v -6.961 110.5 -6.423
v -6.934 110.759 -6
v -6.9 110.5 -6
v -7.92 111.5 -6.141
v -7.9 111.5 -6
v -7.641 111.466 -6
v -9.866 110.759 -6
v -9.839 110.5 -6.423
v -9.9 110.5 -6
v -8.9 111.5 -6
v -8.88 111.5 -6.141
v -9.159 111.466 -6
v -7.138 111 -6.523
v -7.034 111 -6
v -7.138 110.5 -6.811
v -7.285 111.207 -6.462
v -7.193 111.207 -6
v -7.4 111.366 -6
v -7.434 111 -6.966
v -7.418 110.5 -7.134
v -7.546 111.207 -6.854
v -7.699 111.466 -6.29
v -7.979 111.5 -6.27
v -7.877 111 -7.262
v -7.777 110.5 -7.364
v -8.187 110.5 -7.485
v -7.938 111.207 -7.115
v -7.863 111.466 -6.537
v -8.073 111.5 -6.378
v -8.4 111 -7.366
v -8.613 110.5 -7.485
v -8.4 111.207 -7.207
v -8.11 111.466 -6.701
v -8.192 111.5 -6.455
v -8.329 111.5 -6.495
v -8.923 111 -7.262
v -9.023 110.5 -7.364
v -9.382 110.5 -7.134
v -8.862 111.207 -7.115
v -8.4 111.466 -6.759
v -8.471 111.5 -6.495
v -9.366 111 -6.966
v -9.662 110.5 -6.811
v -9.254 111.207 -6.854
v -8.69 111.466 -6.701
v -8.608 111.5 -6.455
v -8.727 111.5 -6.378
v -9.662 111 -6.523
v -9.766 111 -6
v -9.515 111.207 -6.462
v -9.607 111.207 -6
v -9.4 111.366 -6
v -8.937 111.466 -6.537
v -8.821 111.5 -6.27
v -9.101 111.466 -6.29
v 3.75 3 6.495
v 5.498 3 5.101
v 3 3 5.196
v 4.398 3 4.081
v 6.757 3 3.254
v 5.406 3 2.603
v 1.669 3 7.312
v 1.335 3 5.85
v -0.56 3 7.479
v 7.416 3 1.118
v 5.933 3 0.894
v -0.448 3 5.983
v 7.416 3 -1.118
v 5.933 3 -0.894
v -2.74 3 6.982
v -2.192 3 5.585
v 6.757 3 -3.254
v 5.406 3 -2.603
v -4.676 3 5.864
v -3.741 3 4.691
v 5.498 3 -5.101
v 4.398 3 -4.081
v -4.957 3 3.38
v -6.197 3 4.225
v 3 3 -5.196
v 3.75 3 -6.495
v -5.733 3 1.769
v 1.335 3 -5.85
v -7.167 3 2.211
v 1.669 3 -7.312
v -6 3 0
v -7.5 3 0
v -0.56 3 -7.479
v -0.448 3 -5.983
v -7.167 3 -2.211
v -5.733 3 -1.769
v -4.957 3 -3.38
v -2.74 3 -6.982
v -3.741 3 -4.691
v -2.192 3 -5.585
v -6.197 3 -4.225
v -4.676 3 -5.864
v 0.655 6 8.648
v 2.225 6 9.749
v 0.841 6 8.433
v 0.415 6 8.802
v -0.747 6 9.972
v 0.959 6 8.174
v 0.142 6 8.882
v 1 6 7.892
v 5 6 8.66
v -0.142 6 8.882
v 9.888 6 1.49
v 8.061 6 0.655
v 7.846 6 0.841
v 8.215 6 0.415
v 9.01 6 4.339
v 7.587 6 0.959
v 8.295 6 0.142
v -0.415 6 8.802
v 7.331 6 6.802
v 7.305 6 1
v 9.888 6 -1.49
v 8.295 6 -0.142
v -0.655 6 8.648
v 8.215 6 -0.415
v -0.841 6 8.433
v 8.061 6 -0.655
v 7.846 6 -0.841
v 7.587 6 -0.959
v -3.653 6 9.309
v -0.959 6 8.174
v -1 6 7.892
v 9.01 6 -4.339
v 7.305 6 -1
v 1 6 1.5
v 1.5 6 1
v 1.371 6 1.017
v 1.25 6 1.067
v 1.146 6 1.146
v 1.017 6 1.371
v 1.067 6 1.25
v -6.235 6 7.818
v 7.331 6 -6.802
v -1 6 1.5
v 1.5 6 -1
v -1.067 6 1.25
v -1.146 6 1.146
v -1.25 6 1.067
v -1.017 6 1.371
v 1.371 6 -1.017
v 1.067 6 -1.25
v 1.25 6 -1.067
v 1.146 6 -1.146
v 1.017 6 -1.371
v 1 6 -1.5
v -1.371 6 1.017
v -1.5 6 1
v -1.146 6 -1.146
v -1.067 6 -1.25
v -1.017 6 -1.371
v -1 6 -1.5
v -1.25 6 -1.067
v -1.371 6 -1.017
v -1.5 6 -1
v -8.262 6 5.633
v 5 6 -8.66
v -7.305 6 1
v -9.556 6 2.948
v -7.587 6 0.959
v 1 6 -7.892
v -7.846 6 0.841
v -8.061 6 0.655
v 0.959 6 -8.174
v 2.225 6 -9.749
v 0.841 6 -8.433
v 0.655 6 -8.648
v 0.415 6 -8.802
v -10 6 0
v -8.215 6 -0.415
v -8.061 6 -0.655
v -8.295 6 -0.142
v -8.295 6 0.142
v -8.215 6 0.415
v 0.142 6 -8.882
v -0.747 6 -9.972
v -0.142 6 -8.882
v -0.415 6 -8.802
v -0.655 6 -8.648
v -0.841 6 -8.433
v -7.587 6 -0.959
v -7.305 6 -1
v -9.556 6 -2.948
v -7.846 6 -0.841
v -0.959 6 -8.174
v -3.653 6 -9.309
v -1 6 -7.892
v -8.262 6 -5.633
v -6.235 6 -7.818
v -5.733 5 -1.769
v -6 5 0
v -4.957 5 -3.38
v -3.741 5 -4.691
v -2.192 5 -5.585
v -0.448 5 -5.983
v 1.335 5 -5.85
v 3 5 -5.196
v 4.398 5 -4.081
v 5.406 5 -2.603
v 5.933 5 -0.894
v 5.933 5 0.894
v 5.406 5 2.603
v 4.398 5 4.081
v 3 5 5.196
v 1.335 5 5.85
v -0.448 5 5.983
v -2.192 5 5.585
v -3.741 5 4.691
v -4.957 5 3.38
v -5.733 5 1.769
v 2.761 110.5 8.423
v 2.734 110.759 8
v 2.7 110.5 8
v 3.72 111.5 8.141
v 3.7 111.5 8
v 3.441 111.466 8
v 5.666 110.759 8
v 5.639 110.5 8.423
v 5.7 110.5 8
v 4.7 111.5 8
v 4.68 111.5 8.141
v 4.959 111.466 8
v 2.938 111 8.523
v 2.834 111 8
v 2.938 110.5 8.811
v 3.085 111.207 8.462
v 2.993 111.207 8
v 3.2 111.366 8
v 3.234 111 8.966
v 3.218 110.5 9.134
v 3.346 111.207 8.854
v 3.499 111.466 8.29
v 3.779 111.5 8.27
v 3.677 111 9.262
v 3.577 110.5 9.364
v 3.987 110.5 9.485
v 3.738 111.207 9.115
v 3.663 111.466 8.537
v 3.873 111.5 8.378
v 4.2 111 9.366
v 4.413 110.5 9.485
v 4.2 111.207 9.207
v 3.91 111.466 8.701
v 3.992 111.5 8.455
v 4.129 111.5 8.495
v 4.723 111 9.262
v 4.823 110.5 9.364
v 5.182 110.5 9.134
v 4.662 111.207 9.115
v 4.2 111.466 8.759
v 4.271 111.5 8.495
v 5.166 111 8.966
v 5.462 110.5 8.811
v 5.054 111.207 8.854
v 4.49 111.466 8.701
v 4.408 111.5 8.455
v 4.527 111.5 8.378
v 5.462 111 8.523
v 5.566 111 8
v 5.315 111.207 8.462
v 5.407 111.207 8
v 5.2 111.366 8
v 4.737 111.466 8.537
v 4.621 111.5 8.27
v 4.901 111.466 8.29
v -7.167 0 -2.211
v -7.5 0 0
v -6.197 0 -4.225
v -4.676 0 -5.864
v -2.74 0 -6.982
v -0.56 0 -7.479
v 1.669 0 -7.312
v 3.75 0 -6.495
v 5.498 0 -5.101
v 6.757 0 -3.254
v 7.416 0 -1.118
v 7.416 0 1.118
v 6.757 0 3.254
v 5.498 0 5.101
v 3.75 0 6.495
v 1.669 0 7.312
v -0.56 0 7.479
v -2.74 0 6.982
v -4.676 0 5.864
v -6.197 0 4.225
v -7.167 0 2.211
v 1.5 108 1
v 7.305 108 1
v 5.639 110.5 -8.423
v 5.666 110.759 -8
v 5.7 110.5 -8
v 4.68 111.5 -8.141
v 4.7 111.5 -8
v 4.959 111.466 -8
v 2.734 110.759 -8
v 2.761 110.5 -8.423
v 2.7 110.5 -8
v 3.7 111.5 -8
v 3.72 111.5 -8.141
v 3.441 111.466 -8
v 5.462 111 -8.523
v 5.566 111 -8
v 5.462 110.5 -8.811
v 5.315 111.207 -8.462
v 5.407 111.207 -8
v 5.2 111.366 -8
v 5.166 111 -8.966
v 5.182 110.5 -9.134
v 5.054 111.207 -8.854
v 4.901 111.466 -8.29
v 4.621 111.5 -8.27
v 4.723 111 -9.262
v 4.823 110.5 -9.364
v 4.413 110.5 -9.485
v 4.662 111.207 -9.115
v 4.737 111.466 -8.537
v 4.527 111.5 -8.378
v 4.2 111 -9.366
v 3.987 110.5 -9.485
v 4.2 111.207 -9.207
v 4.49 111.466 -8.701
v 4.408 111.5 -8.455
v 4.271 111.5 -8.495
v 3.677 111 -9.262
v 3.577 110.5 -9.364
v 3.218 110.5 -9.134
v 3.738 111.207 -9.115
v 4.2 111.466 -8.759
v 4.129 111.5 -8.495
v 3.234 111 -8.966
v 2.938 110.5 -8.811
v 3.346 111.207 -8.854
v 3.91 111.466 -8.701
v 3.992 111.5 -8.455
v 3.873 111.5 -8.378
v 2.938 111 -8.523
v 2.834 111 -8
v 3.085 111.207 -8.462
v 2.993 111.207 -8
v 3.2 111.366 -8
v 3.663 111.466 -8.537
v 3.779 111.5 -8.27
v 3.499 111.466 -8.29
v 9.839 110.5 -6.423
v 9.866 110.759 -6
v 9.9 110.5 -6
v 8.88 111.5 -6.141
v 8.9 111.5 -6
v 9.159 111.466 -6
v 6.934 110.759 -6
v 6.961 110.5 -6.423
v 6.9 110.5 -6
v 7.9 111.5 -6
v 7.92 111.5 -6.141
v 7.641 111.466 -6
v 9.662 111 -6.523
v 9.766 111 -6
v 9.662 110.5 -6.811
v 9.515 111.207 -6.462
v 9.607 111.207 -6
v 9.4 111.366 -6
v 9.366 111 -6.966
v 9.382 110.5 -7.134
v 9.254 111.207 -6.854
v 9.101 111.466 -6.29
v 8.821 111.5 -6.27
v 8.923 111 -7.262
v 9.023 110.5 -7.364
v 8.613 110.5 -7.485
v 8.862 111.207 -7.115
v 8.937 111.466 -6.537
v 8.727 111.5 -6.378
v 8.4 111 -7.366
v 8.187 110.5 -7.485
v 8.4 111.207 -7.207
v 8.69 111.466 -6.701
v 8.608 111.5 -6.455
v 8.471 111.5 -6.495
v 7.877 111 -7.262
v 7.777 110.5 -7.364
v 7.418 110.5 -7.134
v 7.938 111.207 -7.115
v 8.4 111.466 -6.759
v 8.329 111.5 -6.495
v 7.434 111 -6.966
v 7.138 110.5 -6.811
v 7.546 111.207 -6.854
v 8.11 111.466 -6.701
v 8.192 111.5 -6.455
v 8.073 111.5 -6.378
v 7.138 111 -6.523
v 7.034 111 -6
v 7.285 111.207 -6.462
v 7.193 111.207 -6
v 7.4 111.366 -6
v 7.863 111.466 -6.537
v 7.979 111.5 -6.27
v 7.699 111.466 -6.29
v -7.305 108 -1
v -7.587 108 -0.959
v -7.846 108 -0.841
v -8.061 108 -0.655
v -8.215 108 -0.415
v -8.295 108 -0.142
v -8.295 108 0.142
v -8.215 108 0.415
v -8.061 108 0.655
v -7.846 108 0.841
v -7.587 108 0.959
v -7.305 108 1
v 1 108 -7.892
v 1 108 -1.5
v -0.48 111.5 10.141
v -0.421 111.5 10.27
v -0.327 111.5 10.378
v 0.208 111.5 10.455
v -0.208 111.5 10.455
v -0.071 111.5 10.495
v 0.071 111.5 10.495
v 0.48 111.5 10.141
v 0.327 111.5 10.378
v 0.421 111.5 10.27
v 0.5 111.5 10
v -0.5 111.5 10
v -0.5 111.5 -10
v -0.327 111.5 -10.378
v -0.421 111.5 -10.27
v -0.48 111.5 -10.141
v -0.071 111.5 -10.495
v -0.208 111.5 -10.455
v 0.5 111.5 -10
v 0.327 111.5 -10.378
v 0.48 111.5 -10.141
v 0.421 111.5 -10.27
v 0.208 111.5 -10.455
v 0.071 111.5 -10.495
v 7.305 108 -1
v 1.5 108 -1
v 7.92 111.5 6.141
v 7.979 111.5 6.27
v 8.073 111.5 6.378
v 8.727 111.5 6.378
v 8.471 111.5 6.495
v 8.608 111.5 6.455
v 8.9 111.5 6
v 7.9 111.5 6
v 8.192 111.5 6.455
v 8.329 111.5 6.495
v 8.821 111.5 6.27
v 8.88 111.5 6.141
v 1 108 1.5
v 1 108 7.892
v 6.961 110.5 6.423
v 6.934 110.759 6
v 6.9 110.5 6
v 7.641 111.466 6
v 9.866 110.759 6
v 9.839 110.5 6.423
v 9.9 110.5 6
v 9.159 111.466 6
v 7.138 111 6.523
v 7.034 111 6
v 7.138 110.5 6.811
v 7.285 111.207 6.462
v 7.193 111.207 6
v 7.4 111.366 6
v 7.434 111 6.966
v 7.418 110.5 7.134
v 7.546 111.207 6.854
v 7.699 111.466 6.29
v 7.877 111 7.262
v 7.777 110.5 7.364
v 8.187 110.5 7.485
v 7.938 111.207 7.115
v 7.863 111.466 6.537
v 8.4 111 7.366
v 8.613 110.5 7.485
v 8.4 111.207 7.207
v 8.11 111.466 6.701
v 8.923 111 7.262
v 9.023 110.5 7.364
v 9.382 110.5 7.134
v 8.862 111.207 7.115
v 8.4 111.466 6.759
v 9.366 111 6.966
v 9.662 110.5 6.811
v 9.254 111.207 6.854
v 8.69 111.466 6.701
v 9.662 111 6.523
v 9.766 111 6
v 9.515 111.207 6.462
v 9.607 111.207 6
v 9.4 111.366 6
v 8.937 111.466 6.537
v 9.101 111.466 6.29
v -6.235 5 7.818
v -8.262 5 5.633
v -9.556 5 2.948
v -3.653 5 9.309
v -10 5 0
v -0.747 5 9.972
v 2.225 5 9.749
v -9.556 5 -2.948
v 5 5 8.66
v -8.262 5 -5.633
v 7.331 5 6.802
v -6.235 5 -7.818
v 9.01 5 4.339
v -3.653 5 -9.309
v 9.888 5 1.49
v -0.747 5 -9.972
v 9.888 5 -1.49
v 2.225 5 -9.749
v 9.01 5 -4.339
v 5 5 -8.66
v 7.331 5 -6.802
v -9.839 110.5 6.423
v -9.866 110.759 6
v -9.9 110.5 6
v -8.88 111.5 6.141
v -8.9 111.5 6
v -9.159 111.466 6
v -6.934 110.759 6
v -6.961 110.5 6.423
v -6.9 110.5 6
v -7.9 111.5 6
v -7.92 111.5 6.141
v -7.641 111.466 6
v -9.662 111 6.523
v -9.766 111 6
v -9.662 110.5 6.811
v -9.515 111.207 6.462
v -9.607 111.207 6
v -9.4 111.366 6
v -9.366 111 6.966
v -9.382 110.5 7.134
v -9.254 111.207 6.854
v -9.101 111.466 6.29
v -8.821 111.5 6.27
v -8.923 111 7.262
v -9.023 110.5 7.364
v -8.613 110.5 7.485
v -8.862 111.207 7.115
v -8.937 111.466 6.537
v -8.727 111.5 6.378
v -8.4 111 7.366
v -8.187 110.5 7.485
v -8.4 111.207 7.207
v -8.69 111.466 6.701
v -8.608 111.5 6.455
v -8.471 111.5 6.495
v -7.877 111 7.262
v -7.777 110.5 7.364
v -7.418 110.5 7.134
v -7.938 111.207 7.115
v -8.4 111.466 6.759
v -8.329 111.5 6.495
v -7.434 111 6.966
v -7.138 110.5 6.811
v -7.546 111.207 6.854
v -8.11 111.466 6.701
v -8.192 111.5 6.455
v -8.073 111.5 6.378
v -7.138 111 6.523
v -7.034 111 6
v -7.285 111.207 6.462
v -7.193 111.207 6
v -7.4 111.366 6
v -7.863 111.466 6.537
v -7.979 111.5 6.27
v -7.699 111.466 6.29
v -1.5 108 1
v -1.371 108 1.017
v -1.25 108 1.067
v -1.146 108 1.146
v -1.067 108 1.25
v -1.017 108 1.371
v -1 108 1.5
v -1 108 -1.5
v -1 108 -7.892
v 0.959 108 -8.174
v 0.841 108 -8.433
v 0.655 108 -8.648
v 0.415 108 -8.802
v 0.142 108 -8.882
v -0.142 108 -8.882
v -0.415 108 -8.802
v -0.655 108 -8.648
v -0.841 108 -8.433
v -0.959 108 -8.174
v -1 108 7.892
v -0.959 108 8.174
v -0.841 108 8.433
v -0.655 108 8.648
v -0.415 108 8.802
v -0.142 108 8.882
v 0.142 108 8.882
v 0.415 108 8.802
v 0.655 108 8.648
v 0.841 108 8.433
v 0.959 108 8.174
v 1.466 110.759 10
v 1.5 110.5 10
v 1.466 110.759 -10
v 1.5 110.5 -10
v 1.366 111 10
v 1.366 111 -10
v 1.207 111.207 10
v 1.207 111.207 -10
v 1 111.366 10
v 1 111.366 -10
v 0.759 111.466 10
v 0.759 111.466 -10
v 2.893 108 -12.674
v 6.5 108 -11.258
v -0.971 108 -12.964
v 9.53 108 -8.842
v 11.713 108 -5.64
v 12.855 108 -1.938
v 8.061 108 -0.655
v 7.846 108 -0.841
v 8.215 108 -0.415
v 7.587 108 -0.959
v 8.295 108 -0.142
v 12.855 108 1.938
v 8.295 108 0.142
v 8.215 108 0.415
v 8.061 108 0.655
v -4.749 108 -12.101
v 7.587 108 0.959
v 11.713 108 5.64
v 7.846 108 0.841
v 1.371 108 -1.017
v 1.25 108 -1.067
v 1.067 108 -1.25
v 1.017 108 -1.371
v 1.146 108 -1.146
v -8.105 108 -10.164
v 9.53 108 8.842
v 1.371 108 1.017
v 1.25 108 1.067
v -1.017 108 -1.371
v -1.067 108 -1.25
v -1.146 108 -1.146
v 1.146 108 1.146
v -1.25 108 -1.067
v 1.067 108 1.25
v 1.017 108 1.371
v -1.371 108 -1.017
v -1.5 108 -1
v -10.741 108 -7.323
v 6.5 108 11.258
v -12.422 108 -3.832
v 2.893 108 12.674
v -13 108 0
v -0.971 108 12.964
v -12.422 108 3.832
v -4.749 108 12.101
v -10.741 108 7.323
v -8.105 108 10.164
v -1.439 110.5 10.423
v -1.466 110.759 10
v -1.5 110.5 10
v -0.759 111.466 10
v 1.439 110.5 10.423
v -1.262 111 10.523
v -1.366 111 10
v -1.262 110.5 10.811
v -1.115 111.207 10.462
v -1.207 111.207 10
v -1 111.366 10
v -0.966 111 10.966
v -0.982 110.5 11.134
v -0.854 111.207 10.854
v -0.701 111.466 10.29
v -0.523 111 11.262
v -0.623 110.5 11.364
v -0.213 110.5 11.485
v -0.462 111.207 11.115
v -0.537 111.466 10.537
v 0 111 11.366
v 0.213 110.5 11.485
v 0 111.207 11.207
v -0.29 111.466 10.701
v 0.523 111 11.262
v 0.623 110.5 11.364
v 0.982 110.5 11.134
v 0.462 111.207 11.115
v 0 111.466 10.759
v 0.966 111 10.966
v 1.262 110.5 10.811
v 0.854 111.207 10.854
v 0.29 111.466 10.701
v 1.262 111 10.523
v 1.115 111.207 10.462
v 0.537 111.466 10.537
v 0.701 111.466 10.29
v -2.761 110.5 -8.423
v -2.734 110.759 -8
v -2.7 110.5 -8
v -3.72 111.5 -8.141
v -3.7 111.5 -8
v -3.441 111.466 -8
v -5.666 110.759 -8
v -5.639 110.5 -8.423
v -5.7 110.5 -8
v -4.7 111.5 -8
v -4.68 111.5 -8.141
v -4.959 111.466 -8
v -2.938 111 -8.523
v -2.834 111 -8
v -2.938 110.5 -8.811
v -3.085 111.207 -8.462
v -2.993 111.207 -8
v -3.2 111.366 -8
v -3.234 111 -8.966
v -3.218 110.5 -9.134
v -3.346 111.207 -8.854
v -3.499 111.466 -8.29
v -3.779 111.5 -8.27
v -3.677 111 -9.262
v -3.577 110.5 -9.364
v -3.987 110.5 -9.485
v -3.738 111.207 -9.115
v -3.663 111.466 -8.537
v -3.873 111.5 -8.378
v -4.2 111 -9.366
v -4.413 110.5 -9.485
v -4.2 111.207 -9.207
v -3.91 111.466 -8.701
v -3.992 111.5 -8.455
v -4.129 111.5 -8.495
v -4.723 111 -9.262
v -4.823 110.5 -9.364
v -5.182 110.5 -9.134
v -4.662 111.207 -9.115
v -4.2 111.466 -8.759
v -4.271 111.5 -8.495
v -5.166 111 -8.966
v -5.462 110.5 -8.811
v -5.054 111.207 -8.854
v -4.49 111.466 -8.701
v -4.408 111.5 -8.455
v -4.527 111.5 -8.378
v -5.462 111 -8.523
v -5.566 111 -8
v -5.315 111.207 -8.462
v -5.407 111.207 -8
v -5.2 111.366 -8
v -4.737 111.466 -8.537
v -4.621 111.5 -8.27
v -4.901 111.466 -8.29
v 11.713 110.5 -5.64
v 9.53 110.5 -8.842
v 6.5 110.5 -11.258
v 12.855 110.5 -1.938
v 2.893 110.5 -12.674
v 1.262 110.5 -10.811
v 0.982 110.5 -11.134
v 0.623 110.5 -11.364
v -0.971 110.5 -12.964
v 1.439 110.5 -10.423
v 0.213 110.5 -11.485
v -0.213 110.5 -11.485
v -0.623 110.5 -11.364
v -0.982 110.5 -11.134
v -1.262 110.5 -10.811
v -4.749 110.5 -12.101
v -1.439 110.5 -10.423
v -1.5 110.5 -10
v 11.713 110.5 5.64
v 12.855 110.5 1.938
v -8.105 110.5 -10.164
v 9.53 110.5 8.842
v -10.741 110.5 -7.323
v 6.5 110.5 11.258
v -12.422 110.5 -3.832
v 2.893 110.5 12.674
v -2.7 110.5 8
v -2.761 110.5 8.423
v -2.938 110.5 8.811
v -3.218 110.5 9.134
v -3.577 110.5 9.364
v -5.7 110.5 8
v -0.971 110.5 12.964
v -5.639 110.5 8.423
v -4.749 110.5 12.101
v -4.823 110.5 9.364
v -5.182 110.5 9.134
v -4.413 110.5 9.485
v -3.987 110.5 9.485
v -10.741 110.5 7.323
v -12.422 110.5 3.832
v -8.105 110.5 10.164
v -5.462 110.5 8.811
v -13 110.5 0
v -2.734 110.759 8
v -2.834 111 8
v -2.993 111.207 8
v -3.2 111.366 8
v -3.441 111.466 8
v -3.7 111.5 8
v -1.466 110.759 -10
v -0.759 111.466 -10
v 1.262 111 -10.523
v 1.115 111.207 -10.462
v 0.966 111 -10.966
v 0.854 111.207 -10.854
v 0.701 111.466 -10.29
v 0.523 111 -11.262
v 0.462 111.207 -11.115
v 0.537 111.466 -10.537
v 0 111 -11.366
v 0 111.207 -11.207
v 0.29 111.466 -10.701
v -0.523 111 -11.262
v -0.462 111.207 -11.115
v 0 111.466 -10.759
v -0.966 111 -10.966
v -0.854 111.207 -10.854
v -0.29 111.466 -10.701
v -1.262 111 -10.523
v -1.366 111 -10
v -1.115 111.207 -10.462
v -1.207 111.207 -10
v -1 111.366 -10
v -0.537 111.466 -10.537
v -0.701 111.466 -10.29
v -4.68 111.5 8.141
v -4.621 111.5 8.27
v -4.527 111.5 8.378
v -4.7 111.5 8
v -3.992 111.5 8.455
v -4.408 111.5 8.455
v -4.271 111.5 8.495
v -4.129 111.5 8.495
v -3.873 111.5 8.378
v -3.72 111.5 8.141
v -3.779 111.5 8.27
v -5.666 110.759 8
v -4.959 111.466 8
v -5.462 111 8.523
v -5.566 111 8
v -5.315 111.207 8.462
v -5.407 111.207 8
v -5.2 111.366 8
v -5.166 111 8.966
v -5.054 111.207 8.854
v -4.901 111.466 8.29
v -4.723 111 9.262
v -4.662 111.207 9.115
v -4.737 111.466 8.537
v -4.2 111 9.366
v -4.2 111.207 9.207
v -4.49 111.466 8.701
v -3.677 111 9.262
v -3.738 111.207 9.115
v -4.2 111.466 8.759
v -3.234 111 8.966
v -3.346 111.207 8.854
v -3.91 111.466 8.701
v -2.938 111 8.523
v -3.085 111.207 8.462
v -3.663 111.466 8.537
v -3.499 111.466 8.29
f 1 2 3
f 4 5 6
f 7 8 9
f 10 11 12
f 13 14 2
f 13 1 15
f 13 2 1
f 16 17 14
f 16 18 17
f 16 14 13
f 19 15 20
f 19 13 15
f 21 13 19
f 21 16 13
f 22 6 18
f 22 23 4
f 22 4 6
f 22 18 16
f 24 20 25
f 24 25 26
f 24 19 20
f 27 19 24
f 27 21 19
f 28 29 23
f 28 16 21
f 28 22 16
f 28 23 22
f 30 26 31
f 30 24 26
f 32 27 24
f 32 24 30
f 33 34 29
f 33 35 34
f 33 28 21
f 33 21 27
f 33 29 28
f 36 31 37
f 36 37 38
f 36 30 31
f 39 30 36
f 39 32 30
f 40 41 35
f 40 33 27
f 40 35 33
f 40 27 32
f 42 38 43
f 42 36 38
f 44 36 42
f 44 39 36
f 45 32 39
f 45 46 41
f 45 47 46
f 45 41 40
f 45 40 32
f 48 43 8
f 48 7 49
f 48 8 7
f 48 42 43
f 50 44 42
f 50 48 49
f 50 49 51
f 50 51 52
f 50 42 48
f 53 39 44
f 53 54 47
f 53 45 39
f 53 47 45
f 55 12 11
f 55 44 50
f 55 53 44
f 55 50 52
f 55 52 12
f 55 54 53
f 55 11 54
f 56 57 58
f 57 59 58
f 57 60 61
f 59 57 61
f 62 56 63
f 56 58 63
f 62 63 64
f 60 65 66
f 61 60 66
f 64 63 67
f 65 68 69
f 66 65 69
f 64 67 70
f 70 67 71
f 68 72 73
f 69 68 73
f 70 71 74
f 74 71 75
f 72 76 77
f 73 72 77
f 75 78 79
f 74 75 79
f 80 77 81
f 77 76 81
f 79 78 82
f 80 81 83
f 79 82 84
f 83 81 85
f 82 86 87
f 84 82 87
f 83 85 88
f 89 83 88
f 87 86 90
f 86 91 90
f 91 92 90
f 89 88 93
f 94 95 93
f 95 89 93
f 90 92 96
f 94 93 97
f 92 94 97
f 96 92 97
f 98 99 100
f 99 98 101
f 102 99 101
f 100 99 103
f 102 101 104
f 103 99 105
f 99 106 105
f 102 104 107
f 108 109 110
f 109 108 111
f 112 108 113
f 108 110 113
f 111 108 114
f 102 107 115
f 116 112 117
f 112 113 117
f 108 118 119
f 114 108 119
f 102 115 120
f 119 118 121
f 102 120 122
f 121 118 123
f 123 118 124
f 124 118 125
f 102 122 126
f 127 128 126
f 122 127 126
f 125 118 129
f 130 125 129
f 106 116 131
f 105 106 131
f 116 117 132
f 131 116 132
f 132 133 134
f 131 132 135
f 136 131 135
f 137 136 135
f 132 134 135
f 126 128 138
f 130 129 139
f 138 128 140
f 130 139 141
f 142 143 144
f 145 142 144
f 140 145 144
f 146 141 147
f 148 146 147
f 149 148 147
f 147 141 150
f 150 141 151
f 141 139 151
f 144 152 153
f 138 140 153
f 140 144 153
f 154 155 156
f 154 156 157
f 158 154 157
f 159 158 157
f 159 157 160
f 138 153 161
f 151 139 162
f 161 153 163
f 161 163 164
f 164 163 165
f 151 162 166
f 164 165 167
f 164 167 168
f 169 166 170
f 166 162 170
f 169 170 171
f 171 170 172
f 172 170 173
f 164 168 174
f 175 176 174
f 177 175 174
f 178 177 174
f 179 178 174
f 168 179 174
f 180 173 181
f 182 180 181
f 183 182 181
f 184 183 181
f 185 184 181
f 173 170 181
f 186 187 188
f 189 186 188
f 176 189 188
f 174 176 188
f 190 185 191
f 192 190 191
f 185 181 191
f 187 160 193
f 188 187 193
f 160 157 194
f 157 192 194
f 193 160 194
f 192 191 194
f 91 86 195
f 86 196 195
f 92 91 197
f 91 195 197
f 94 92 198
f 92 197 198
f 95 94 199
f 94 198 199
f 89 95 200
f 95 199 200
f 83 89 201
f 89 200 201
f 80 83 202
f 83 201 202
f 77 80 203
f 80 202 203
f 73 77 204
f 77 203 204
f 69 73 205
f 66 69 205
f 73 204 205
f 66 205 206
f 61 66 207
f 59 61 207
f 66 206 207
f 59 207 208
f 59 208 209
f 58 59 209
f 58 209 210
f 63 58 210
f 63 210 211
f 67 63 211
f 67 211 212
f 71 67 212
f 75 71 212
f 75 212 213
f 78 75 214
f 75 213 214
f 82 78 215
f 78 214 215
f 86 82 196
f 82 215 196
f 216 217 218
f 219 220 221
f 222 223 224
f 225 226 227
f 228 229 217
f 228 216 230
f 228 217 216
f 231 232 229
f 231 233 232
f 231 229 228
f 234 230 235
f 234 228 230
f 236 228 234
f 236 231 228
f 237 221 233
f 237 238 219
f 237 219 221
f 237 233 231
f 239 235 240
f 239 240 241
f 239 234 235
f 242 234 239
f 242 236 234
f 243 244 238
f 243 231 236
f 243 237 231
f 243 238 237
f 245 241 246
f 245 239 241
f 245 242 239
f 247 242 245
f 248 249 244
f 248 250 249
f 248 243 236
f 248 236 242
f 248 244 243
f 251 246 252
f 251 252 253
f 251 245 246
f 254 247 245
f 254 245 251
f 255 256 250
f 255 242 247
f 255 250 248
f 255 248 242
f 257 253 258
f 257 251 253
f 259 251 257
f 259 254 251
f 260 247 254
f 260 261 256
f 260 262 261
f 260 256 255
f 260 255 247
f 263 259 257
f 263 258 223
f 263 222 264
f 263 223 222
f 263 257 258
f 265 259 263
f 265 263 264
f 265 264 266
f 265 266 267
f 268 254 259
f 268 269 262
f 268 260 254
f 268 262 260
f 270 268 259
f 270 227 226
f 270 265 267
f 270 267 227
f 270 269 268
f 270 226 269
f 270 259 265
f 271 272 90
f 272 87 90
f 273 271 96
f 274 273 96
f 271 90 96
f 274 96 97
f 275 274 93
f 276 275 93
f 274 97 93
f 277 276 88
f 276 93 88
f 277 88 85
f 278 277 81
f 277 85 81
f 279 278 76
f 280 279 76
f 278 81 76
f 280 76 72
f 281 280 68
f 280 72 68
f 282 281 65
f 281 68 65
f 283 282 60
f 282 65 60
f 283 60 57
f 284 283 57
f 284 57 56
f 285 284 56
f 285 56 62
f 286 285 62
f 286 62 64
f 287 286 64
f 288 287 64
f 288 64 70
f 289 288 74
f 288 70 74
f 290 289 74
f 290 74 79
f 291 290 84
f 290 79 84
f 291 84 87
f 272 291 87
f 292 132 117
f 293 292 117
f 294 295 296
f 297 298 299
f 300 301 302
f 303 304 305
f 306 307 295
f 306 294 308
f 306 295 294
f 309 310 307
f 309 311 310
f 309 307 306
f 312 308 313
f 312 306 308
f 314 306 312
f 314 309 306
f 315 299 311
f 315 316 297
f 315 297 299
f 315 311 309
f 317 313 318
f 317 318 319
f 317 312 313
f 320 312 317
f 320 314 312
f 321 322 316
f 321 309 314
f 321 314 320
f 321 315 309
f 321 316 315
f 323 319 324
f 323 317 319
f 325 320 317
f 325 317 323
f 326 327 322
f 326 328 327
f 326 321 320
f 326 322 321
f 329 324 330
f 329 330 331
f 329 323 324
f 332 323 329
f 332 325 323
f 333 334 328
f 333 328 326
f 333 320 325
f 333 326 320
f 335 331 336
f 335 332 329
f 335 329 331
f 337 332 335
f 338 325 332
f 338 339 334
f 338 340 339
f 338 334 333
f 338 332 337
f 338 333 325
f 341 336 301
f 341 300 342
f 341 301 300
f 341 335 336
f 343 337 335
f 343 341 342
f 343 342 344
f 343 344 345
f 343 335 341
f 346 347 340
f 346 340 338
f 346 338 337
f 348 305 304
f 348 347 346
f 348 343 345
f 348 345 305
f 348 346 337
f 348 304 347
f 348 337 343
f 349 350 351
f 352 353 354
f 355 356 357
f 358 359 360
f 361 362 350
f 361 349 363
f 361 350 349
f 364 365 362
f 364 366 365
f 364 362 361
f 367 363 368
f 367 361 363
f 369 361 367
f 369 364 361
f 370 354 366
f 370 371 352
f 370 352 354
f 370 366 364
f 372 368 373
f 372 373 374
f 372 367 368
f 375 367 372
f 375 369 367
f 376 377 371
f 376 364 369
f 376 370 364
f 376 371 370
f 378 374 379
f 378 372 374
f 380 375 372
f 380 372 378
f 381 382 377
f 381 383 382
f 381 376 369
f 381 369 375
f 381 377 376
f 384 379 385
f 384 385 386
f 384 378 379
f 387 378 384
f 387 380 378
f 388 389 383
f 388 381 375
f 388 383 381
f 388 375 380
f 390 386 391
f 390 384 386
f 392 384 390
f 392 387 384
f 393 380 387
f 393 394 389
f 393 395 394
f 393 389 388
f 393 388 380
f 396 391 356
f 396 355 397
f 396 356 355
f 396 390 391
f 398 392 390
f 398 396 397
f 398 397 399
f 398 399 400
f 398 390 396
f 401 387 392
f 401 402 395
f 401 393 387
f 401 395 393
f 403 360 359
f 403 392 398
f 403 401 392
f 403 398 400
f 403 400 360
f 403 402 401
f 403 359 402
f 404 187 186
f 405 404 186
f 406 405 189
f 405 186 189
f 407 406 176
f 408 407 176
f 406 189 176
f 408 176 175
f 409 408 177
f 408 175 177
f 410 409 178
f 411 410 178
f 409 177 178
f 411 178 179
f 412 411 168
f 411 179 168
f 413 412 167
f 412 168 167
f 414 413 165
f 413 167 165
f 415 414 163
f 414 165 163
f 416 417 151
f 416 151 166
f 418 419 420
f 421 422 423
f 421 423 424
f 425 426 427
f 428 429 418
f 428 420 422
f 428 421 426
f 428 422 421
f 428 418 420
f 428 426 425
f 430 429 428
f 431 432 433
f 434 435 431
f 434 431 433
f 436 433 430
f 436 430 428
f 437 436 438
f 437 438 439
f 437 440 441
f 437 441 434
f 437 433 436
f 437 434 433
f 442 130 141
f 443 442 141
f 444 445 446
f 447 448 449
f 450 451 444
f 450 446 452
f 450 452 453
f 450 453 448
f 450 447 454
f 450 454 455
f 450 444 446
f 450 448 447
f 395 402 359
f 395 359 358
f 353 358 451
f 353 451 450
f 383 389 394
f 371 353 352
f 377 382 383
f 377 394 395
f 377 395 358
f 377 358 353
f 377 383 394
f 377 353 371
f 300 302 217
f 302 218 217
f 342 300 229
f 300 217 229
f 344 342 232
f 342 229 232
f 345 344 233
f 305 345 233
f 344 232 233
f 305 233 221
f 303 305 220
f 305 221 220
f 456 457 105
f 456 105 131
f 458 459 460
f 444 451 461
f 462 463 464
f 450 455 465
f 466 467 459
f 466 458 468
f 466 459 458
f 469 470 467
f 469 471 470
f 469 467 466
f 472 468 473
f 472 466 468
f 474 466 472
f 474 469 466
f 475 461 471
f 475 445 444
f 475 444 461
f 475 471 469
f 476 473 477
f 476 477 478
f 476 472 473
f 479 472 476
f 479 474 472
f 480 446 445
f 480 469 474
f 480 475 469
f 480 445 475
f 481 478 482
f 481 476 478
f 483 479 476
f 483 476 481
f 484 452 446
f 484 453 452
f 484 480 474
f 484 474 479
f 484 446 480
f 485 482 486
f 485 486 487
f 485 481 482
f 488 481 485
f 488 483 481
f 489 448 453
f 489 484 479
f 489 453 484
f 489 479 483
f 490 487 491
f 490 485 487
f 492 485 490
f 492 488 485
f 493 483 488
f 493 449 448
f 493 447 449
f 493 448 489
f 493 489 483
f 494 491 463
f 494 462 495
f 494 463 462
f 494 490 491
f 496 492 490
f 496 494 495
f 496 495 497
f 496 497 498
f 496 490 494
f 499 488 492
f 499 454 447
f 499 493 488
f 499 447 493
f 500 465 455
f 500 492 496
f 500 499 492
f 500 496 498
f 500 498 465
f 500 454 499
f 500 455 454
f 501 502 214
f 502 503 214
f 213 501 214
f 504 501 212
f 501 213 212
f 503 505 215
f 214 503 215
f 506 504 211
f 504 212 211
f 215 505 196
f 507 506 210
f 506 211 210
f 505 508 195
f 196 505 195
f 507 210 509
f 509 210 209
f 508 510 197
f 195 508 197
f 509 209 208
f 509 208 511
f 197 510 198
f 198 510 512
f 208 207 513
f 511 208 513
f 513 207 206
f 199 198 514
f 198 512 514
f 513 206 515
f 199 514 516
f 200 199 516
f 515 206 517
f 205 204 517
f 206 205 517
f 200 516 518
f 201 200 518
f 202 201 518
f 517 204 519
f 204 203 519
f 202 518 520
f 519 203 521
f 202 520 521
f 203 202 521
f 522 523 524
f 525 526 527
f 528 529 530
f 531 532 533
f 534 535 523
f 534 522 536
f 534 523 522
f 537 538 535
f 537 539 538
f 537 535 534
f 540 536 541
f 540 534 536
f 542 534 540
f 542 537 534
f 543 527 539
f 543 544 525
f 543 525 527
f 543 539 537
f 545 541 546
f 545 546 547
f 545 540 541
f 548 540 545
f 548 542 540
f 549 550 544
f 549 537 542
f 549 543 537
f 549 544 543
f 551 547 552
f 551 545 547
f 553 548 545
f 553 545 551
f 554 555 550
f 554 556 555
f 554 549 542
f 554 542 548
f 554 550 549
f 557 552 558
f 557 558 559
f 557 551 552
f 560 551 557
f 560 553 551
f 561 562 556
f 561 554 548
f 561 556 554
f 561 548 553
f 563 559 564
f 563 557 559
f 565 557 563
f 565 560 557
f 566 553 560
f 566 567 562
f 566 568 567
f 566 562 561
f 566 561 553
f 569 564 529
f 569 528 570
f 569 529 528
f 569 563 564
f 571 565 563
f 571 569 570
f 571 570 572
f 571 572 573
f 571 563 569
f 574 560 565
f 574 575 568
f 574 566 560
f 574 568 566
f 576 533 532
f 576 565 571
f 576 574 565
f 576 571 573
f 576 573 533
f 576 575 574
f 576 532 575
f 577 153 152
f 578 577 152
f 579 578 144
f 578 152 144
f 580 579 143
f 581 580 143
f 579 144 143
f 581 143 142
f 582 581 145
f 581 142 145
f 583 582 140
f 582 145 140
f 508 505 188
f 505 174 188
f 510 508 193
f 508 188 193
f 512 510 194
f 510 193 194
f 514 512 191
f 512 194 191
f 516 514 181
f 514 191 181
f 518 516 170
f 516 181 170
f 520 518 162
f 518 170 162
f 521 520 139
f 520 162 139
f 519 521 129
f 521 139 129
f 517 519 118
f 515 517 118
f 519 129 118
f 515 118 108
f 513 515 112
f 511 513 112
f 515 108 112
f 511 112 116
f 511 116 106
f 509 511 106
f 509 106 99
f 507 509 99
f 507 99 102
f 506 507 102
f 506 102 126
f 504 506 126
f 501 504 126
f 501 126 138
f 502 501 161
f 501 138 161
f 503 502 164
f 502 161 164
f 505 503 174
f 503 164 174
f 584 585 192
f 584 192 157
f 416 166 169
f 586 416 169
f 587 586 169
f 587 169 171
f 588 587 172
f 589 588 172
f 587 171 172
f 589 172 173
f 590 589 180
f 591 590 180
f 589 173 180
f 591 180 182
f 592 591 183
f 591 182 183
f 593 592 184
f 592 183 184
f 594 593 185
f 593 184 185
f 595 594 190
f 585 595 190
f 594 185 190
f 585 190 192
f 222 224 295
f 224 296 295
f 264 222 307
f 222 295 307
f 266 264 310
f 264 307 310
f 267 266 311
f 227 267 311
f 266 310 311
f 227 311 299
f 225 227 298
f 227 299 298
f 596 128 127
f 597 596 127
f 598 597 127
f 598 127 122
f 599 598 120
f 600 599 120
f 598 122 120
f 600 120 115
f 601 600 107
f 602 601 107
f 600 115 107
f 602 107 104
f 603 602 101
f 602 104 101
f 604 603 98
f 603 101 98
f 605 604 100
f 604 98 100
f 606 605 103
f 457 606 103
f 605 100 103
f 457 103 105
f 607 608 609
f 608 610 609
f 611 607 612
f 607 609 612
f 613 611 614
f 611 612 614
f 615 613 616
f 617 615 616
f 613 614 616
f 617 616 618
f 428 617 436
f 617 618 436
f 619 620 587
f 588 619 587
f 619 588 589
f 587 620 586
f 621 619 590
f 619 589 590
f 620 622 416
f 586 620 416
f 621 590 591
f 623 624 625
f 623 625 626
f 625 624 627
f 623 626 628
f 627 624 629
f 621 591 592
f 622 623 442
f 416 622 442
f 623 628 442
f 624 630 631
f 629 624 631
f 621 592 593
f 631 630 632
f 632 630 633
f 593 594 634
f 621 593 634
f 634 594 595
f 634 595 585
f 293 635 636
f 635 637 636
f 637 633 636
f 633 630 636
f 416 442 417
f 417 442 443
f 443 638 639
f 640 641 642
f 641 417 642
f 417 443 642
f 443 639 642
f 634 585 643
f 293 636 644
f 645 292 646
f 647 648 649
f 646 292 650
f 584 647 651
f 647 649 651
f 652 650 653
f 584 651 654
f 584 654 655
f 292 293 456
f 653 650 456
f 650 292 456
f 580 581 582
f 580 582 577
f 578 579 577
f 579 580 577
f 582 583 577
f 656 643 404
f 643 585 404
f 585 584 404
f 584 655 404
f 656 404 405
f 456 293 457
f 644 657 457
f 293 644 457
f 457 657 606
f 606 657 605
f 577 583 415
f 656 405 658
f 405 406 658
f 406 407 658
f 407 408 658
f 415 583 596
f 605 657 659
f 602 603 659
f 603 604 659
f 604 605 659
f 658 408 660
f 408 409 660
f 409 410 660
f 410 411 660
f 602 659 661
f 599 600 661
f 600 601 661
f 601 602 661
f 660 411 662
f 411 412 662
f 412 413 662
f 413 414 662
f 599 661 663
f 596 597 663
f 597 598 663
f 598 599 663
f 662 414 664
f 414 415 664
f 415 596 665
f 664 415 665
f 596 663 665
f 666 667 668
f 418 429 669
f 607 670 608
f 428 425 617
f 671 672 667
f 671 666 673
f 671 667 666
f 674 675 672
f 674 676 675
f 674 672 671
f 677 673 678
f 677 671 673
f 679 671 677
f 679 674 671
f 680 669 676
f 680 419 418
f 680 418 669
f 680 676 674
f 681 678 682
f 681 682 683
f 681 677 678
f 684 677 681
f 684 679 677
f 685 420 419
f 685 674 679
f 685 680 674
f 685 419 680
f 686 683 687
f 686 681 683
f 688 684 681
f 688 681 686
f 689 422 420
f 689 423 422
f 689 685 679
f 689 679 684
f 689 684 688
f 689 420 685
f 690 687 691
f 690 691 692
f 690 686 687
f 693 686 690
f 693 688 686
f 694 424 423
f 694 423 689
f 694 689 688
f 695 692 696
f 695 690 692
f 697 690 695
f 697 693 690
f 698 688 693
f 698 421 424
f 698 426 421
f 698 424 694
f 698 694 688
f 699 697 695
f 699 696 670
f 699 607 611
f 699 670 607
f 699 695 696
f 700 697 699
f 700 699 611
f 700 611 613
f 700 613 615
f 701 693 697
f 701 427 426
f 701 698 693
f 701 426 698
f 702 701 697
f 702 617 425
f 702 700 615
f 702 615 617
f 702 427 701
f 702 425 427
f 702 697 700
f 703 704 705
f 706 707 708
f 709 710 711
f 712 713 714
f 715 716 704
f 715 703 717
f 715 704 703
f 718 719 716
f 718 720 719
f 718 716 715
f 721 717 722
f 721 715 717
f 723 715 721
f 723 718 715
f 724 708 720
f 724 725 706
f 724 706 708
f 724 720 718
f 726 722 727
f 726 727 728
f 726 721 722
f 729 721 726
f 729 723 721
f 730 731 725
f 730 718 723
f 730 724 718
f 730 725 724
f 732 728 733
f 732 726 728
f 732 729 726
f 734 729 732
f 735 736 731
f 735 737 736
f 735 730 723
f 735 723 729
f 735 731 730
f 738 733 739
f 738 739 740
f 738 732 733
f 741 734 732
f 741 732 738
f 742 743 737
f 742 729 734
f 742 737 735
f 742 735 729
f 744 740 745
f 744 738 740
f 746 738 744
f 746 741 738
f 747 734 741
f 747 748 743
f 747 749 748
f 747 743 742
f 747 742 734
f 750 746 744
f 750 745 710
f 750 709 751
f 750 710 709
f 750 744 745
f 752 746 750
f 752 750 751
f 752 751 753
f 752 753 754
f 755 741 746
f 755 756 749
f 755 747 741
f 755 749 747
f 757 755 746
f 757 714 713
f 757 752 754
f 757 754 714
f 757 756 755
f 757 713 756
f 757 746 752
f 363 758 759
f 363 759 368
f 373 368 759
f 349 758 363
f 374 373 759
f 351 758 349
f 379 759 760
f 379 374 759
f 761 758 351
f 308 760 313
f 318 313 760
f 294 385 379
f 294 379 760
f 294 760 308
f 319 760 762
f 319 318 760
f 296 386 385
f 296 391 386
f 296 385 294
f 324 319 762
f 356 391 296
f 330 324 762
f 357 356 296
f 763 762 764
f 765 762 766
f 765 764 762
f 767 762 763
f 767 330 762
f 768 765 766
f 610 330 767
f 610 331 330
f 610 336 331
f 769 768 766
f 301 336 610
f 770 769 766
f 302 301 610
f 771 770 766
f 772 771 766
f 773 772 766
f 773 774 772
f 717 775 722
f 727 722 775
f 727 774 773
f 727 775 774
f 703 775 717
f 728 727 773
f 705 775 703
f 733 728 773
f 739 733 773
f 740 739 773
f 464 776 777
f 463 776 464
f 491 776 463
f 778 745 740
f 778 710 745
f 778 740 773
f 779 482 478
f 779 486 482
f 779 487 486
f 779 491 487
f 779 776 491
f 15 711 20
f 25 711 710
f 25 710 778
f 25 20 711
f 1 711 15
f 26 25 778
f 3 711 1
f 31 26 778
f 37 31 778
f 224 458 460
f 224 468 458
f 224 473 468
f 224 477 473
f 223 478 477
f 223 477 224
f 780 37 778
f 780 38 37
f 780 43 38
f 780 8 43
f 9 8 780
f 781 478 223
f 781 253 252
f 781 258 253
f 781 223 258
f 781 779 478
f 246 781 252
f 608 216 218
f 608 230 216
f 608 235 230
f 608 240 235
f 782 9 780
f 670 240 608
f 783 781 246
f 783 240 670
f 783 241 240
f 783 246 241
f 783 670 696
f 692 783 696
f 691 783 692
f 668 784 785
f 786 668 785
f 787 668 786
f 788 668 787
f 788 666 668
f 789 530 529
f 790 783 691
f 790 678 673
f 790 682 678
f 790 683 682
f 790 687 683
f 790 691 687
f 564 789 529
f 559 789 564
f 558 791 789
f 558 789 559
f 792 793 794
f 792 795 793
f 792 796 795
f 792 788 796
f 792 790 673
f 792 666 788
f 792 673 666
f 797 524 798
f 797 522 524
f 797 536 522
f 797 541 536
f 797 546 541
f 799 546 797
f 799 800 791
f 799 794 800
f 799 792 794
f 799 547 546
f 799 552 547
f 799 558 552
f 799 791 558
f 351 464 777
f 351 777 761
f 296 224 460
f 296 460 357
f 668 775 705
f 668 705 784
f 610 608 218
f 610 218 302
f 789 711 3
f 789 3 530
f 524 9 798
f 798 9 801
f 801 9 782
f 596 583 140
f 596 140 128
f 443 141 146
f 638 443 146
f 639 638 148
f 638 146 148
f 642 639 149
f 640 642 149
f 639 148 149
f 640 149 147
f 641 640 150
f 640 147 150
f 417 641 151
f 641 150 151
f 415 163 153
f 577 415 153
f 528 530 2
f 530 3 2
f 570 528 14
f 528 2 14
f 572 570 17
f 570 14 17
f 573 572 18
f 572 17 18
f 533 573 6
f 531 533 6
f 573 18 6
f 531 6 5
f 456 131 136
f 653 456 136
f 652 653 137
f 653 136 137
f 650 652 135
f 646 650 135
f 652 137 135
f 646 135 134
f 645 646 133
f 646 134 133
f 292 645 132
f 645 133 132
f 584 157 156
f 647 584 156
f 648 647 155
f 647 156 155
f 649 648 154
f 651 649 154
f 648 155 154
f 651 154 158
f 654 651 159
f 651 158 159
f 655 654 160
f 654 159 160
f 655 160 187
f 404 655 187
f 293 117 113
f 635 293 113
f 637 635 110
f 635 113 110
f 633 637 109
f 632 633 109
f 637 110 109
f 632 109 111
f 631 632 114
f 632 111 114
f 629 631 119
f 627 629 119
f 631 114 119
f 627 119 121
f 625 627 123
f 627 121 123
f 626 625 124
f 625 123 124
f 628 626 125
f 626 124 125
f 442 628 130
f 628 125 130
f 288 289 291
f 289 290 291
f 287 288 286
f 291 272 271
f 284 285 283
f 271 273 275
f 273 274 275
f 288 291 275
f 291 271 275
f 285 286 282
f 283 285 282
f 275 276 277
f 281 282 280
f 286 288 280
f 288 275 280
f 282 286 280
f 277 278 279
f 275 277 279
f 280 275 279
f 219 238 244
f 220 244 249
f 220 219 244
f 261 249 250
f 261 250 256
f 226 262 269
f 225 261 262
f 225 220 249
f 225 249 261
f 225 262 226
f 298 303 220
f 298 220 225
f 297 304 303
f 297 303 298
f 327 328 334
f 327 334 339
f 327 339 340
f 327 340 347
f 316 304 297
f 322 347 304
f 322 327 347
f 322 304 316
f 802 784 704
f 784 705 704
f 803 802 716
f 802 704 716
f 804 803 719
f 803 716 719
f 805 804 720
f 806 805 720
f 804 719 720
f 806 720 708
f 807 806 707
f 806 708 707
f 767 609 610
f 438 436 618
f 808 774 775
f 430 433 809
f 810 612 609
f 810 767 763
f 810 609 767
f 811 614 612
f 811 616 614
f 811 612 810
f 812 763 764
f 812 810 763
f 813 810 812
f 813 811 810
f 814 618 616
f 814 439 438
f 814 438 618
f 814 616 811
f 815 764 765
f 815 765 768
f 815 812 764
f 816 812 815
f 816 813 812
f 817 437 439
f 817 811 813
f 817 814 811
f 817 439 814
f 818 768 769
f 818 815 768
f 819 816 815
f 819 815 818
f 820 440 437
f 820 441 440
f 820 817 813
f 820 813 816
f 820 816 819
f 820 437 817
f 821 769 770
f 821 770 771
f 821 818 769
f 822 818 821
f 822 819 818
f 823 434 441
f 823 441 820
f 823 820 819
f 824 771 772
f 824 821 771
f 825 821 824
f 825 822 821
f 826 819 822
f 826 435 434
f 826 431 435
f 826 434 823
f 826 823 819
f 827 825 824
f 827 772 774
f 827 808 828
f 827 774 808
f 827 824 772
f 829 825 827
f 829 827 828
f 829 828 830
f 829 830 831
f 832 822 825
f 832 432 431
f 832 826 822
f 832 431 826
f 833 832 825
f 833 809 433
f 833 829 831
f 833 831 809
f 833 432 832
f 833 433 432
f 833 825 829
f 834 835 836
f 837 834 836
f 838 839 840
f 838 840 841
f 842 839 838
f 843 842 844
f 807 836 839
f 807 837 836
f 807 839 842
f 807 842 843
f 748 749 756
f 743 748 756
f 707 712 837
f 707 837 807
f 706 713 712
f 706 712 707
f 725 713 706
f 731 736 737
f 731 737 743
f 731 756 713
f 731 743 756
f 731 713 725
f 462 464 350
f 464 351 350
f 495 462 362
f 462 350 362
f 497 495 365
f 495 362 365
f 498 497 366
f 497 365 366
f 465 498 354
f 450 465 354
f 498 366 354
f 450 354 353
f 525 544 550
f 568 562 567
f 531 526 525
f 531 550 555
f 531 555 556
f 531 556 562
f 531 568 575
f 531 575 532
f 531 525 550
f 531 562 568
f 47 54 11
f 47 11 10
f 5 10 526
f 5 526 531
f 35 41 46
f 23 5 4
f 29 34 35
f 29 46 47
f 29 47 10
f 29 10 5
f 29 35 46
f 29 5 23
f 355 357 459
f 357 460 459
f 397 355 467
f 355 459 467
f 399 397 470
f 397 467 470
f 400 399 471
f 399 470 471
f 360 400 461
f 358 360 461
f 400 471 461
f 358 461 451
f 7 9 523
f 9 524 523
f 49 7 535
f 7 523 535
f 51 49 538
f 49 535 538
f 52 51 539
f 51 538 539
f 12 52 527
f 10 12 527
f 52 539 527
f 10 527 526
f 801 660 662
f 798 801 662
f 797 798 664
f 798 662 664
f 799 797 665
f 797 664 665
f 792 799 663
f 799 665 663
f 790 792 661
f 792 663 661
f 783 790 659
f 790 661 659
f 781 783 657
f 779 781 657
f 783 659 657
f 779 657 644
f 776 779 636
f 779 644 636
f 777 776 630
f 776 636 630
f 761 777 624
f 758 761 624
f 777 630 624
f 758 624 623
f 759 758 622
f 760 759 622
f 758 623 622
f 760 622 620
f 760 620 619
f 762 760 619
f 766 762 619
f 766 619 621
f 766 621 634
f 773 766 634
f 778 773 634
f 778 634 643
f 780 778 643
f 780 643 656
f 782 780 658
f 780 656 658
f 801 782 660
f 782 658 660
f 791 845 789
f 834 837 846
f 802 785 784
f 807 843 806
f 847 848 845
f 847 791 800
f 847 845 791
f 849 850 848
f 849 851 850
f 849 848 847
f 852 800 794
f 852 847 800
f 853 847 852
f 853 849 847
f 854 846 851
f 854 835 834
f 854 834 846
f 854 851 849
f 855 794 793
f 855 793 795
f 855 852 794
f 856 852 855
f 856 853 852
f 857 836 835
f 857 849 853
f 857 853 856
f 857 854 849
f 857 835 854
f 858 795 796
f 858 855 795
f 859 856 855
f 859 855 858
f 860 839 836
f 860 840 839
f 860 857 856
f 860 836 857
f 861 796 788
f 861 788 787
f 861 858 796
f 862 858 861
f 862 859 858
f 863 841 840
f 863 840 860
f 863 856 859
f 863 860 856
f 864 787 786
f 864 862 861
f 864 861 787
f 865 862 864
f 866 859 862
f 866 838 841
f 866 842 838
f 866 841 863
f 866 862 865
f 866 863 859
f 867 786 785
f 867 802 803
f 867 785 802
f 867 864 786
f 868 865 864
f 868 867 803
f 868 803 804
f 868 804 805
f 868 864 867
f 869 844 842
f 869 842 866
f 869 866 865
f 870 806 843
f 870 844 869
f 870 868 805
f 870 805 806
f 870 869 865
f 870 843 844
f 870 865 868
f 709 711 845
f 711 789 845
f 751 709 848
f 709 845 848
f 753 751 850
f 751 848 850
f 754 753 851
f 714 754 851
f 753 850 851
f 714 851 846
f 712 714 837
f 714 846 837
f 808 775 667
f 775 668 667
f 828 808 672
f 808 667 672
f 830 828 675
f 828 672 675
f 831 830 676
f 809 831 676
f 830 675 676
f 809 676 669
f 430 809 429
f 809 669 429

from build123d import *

# Parameters (mm, degrees)
BOSS_EXTRUDE1_DEPTH = 102
SKETCH3_R           = 13
BOSS_EXTRUDE3_DEPTH = 2.5
BOSS_EXTRUDE4_DEPTH = 1
FILLET1_R           = 1


with BuildPart() as part:
    # Sketch1 → Revolve1 (revolve)
    with BuildSketch(Plane.XY, mode=Mode.PRIVATE) as revolve1_sk:
        Polygon((0, 0), (7.5, 0), (7.5, 3), (6, 3), (6, 5), (10, 5), (10, 6), (0, 6), align=None)
    revolve(revolve1_sk.sketch.rotate(Axis((0, 6, 0), (0, -1, 0)), 180), axis=Axis((0, 6, 0), (0, -1, 0)))

    # Sketch2 → Boss-Extrude1 (add)
    with BuildSketch(Plane(origin=(0, 6, 0), x_dir=(1, 0, 0), z_dir=(0, 1, 0))):
        with BuildLine():
            Line((-1, 7.891889069), (-1, 1.5))
            ThreePointArc((-1, 1.5), (-1.146446609, 1.146446609), (-1.5, 1))
            Line((-1.5, 1), (-7.304889055, 1))
            ThreePointArc((-7.304889055, 1), (-8.304889055, 0), (-7.304889055, -1))
            Line((-7.304889055, -1), (-1.5, -1))
            ThreePointArc((-1.5, -1), (-1.146446609, -1.146446609), (-1, -1.5))
            Line((-1, -1.5), (-1, -7.891889069))
            ThreePointArc((-1, -7.891889069), (0, -8.891889069), (1, -7.891889069))
            Line((1, -7.891889069), (1, -1.5))
            ThreePointArc((1, -1.5), (1.146446609, -1.146446609), (1.5, -1))
            Line((1.5, -1), (7.304889055, -1))
            ThreePointArc((7.304889055, -1), (8.304889055, 0), (7.304889055, 1))
            Line((7.304889055, 1), (1.5, 1))
            ThreePointArc((1.5, 1), (1.146446609, 1.146446609), (1, 1.5))
            Line((1, 1.5), (1, 7.891889069))
            ThreePointArc((1, 7.891889069), (0, 8.891889069), (-1, 7.891889069))
        make_face()
    extrude(amount=BOSS_EXTRUDE1_DEPTH)

    # Sketch3 → Boss-Extrude3 (add)
    with BuildSketch(Plane(origin=(0, 108, 0), x_dir=(1, 0, 0), z_dir=(0, 1, 0))):
        with Locations(Location((0, 0, 0), (0, 0, 180))):
            Circle(SKETCH3_R)
    extrude(amount=BOSS_EXTRUDE3_DEPTH)

    # Sketch4 → Boss-Extrude4 (add)
    with BuildSketch(Plane(origin=(0, 110.5, 0), x_dir=(1, 0, 0), z_dir=(0, 1, 0))):
        with BuildLine():
            Line((-1.5, 10), (-1.5, -10))
            ThreePointArc((-1.5, -10), (0, -11.5), (1.5, -10))
            Line((1.5, -10), (1.5, 10))
            ThreePointArc((1.5, 10), (0, 11.5), (-1.5, 10))
        make_face()
        with BuildLine():
            Line((-5.7, 8), (-5.7, -8))
            ThreePointArc((-5.7, -8), (-4.2, -9.5), (-2.7, -8))
            Line((-2.7, -8), (-2.7, 8))
            ThreePointArc((-2.7, 8), (-4.2, 9.5), (-5.7, 8))
        make_face()
        with BuildLine():
            Line((-9.9, 6), (-9.9, -6))
            ThreePointArc((-9.9, -6), (-8.4, -7.5), (-6.9, -6))
            Line((-6.9, -6), (-6.9, 6))
            ThreePointArc((-6.9, 6), (-8.4, 7.5), (-9.9, 6))
        make_face()
        with BuildLine():
            Line((6.9, 6), (6.9, -6))
            ThreePointArc((6.9, -6), (8.4, -7.5), (9.9, -6))
            Line((9.9, -6), (9.9, 6))
            ThreePointArc((9.9, 6), (8.4, 7.5), (6.9, 6))
        make_face()
        with BuildLine():
            Line((2.7, 8), (2.7, -8))
            ThreePointArc((2.7, -8), (4.2, -9.5), (5.7, -8))
            Line((5.7, -8), (5.7, 8))
            ThreePointArc((5.7, 8), (4.2, 9.5), (2.7, 8))
        make_face()
    extrude(amount=BOSS_EXTRUDE4_DEPTH)

    # Fillet1
    fillet1_edges = [part.edges().sort_by_distance(p)[0] for p in [
        (9.9, 111.5, 0),
        (8.4, 111.5, 7.5),
        (6.9, 111.5, 0),
        (8.4, 111.5, -7.5),
        (2.7, 111.5, 0),
        (4.2, 111.5, -9.5),
        (5.7, 111.5, 0),
        (4.2, 111.5, 9.5),
        (1.5, 111.5, 0),
        (0, 111.5, 11.5),
        (-1.5, 111.5, 0),
        (0, 111.5, -11.5),
        (-5.7, 111.5, 0),
        (-4.2, 111.5, -9.5),
        (-2.7, 111.5, 0),
        (-4.2, 111.5, 9.5),
        (-6.9, 111.5, 0),
        (-8.4, 111.5, 7.5),
        (-9.9, 111.5, 0),
        (-8.4, 111.5, -7.5),
    ]]
    fillet(fillet1_edges, radius=FILLET1_R - 0.0001)  # a hair under: the kernel refuses the full size


solid = part.part
